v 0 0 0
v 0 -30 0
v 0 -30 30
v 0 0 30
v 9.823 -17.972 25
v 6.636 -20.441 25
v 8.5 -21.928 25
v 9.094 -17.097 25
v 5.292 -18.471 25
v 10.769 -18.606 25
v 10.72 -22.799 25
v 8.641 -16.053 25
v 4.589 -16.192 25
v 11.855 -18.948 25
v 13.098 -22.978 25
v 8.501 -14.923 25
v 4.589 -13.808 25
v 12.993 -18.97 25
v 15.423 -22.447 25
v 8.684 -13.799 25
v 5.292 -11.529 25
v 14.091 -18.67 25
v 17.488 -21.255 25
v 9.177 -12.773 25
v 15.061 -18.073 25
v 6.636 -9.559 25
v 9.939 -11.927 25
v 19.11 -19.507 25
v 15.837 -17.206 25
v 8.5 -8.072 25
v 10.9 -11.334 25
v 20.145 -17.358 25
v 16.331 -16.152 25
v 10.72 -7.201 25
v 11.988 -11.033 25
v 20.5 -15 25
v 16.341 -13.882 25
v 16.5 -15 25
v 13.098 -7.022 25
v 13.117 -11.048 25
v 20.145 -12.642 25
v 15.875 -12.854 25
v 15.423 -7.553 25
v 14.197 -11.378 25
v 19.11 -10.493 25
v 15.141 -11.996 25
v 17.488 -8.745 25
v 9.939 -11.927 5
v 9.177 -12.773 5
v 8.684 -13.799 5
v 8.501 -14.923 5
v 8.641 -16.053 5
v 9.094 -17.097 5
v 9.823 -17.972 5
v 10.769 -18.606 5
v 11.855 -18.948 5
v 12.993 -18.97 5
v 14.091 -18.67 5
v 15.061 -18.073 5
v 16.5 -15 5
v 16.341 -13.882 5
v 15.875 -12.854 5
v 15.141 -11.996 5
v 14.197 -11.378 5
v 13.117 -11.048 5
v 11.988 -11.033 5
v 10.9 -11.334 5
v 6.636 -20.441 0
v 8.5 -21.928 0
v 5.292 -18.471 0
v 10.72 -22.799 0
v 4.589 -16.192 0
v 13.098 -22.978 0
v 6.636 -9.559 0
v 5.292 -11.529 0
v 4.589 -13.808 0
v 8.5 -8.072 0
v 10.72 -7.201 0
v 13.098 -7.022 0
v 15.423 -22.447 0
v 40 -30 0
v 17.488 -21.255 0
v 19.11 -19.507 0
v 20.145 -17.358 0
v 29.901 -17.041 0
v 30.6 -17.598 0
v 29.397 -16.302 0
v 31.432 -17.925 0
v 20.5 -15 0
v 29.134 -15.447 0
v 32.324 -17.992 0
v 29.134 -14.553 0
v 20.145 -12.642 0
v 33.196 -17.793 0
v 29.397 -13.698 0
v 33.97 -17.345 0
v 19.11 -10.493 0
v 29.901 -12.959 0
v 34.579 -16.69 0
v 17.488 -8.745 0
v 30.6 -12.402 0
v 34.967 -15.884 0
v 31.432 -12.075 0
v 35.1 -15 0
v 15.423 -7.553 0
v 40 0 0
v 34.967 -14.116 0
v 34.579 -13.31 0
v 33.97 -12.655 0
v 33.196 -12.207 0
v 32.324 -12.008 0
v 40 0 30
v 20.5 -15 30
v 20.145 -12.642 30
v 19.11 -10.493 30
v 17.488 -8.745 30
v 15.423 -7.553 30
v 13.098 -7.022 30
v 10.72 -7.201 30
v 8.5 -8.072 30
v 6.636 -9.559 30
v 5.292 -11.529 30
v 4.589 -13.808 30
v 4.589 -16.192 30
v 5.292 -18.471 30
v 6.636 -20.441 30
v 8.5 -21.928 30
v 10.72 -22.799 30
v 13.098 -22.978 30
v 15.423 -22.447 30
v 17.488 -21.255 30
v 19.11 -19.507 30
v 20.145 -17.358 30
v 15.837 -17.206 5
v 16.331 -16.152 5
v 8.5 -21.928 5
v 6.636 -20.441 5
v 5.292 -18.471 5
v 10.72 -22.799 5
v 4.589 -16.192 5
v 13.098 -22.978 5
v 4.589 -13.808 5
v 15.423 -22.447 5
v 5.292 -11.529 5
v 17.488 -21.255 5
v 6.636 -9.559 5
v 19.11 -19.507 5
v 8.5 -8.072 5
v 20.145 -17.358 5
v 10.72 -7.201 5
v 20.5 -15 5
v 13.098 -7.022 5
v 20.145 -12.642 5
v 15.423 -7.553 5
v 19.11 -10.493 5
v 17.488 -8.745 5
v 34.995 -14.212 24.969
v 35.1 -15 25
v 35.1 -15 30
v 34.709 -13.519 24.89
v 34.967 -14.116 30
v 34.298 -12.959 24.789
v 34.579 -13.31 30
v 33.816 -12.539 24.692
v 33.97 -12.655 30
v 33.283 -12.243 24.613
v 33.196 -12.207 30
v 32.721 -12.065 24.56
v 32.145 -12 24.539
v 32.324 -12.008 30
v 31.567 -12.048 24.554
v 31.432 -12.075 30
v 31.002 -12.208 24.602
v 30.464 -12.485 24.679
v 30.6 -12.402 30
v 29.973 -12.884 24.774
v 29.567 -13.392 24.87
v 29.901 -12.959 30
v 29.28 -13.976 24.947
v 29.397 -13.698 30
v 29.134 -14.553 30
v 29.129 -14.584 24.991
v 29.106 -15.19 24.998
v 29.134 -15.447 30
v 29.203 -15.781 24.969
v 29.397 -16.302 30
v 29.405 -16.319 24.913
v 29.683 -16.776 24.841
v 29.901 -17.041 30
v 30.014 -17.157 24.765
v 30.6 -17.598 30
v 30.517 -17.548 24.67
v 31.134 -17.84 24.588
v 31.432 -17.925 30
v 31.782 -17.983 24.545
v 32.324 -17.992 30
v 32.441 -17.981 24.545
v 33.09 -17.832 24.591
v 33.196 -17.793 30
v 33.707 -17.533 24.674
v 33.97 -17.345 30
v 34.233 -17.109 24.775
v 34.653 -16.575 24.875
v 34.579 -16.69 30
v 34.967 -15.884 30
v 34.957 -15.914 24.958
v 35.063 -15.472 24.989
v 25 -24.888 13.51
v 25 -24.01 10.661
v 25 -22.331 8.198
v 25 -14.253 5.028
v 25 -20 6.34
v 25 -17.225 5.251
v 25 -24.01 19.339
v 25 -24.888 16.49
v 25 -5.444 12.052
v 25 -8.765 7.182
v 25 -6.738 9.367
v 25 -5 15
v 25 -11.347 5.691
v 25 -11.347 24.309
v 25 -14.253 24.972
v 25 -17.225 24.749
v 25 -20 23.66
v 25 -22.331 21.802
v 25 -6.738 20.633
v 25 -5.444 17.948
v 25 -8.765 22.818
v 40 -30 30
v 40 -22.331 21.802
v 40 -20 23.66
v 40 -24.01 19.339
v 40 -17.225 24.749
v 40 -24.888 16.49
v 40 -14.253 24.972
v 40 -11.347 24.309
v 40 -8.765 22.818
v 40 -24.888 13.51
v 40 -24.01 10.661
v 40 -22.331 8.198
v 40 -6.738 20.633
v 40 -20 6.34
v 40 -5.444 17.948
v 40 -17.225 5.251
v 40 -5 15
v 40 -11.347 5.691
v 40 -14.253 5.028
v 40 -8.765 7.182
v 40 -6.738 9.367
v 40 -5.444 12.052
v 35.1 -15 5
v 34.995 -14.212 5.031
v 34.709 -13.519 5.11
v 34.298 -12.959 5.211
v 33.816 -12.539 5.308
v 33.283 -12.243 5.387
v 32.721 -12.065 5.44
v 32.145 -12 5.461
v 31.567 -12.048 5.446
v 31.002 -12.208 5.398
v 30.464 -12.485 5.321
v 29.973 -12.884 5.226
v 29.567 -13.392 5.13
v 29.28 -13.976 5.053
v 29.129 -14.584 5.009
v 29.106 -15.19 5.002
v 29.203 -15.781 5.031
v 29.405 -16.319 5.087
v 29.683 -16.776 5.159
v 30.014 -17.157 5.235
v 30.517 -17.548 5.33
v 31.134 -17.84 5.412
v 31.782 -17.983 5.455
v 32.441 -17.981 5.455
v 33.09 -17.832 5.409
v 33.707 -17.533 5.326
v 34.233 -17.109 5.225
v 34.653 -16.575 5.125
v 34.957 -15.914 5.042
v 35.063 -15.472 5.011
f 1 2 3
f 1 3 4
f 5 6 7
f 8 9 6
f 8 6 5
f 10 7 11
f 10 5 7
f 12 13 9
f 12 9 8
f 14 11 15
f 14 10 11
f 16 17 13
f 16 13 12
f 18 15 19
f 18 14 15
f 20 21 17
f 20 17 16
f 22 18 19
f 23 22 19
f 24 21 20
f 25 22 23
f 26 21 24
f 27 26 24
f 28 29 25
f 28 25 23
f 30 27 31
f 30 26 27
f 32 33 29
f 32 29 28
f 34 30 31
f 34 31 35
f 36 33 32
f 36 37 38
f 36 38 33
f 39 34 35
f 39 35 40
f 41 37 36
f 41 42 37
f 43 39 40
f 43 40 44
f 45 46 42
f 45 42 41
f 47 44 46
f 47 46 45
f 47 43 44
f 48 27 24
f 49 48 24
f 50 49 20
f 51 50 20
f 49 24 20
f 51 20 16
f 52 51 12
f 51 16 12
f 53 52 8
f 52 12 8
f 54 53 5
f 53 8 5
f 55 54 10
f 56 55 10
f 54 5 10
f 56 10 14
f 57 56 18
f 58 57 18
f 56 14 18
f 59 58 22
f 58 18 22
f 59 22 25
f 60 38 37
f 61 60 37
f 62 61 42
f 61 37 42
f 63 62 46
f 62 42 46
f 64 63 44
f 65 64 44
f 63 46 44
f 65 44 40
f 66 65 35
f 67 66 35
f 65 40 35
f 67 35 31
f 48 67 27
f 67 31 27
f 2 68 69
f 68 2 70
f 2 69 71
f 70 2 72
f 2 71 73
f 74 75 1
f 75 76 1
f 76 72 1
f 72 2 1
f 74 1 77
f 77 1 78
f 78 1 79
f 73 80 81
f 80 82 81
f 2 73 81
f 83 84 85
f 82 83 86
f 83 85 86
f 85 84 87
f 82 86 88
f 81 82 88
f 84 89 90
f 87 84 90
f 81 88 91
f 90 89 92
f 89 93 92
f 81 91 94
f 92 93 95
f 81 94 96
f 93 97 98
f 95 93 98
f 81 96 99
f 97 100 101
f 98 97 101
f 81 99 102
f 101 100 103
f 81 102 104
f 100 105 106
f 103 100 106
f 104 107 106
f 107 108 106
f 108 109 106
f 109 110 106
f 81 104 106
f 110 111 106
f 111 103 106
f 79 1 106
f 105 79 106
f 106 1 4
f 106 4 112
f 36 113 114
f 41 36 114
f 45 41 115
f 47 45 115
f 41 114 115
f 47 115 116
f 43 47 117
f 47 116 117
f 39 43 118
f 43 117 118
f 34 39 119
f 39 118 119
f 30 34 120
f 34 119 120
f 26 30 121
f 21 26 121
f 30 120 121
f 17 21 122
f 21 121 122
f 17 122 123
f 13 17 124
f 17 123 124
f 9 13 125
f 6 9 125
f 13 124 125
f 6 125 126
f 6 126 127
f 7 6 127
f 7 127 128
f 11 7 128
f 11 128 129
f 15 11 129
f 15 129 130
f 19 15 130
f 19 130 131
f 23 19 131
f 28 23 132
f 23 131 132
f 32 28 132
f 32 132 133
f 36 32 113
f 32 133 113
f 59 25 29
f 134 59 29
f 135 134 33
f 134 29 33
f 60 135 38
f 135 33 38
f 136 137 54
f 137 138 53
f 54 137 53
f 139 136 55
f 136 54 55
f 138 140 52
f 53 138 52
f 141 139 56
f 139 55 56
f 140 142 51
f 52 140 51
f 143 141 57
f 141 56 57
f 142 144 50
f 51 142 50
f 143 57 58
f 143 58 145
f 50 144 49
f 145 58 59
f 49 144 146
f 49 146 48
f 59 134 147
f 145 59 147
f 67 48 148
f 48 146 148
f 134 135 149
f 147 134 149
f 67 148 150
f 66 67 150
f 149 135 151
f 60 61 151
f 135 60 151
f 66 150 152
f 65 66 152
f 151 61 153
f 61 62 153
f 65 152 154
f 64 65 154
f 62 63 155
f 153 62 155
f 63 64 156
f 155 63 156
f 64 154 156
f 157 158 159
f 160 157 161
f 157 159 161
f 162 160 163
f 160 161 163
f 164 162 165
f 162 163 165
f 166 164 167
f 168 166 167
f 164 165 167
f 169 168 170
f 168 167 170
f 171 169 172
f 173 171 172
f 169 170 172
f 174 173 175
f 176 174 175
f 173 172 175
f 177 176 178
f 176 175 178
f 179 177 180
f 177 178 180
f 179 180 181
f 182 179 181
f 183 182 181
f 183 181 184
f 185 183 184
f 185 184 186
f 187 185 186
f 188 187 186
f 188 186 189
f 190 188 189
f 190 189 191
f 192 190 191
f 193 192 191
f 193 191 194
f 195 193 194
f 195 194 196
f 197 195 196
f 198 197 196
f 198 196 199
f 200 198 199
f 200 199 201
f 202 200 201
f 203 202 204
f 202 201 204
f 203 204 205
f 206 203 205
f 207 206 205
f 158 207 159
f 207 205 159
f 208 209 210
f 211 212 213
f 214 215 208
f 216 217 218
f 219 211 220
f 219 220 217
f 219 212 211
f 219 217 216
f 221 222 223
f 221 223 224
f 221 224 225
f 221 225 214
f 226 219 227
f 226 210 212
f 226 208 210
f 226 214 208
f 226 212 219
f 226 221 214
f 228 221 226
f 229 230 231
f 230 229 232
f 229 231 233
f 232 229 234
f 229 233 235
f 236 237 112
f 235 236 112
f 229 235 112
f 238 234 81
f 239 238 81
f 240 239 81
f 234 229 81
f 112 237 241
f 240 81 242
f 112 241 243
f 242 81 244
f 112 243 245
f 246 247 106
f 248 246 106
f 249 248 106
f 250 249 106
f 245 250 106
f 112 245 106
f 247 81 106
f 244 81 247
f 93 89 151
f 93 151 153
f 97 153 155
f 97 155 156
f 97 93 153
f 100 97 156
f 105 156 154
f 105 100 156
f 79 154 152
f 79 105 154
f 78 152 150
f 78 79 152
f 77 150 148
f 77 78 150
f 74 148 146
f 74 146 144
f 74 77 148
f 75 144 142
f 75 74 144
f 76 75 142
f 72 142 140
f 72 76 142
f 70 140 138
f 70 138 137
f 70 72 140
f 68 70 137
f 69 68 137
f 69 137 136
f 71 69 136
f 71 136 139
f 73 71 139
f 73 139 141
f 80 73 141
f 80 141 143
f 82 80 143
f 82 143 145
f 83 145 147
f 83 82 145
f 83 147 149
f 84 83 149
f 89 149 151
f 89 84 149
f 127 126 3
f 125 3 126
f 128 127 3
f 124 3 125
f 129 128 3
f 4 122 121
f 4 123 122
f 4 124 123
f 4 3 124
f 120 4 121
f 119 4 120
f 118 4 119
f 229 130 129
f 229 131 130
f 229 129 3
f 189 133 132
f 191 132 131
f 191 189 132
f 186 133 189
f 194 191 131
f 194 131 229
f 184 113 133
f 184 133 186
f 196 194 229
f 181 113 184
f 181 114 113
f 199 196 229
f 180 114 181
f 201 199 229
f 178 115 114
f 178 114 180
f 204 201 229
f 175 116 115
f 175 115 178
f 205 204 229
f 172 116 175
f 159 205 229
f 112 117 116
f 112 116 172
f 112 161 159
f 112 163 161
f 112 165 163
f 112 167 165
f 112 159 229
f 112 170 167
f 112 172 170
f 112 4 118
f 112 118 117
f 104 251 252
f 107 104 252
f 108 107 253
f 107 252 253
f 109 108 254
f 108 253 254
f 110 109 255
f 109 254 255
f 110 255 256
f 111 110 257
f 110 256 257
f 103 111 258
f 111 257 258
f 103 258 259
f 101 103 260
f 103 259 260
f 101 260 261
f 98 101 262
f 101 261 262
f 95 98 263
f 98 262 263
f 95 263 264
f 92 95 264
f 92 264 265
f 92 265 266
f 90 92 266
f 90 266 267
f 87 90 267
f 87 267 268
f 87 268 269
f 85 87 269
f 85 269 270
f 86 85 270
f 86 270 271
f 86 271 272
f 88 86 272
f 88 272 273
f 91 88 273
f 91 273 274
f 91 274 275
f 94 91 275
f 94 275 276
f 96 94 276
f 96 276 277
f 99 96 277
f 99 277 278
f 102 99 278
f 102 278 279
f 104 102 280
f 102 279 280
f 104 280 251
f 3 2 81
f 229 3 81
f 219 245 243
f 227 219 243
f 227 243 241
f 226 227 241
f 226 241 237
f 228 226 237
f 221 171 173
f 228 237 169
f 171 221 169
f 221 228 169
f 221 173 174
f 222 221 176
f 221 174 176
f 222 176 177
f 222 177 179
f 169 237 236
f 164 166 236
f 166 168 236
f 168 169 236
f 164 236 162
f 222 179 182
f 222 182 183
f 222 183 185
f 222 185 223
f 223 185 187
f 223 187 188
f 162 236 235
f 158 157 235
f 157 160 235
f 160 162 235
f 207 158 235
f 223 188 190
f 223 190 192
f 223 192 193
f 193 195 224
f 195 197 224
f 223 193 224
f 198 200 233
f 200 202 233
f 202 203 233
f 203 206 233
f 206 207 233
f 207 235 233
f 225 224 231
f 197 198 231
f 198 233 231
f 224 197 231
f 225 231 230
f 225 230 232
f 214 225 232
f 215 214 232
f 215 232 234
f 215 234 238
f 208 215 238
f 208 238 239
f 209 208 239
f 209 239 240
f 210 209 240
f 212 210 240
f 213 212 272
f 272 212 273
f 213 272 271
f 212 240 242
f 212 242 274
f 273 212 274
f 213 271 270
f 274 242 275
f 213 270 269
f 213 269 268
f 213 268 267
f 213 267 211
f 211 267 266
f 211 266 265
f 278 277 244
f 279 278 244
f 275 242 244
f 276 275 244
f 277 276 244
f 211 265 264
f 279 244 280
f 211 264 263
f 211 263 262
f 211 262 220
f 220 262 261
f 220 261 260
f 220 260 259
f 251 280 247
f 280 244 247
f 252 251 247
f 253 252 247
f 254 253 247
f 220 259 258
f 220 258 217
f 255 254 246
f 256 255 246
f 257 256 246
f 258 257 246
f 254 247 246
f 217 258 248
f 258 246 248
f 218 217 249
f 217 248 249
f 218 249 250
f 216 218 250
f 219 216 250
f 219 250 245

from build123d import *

# Parameters (mm, degrees)
SKETCH9_W           = 40
SKETCH9_H           = 30
BOSS_EXTRUDE2_DEPTH = 30
SKETCH10_R          = 10
CUT_EXTRUDE1_DEPTH  = 15
SKETCH11_R          = 8
SKETCH11_R_2        = 4
CUT_EXTRUDE2_DEPTH  = 5
SKETCH11_3_R        = 4
CUT_EXTRUDE3_DEPTH  = 101
SKETCH12_R          = 3
CUT_EXTRUDE4_DEPTH  = 101


with BuildPart() as part:
    # Sketch9 → Boss-Extrude2 (new body)
    with BuildSketch(Plane.XY):
        with Locations((20, -15)):
            Rectangle(SKETCH9_W, SKETCH9_H)
    extrude(amount=BOSS_EXTRUDE2_DEPTH)

    # Sketch10 → Cut-Extrude1 (cut)
    with BuildSketch(Plane(origin=(40, 0, 0), x_dir=(0, 0, -1), z_dir=(1, 0, 0))):
        with Locations((-15, -15)):
            Circle(SKETCH10_R)
    extrude(amount=-CUT_EXTRUDE1_DEPTH, mode=Mode.SUBTRACT)

    # Sketch11 → Cut-Extrude2 (cut)
    with BuildSketch(Plane.XY.offset(30)):
        with Locations((12.5, -15)):
            Circle(SKETCH11_R)
        with Locations((12.5, -15)):
            Circle(SKETCH11_R_2, mode=Mode.SUBTRACT)
    cut_extrude2 = extrude(amount=-CUT_EXTRUDE2_DEPTH, mode=Mode.SUBTRACT)

    # Sketch11<3> → Cut-Extrude3 (cut)
    with BuildSketch(Plane.XY.offset(30)):
        with Locations((12.5, -15)):
            Circle(SKETCH11_3_R)
    extrude(amount=-CUT_EXTRUDE3_DEPTH, mode=Mode.SUBTRACT)

    # Sketch12 → Cut-Extrude4 (cut)
    with BuildSketch(Plane.XY.offset(30)):
        with Locations((32.1, -15)):
            Circle(SKETCH12_R)
    extrude(amount=-CUT_EXTRUDE4_DEPTH, mode=Mode.SUBTRACT)

    # Mirror1: Cut-Extrude2 across plane
    add(cut_extrude2.mirror(Plane(origin=(0, 0, 15), x_dir=(1, 0, 0), z_dir=(0, 0, -1))), mode=Mode.SUBTRACT)


solid = part.part
